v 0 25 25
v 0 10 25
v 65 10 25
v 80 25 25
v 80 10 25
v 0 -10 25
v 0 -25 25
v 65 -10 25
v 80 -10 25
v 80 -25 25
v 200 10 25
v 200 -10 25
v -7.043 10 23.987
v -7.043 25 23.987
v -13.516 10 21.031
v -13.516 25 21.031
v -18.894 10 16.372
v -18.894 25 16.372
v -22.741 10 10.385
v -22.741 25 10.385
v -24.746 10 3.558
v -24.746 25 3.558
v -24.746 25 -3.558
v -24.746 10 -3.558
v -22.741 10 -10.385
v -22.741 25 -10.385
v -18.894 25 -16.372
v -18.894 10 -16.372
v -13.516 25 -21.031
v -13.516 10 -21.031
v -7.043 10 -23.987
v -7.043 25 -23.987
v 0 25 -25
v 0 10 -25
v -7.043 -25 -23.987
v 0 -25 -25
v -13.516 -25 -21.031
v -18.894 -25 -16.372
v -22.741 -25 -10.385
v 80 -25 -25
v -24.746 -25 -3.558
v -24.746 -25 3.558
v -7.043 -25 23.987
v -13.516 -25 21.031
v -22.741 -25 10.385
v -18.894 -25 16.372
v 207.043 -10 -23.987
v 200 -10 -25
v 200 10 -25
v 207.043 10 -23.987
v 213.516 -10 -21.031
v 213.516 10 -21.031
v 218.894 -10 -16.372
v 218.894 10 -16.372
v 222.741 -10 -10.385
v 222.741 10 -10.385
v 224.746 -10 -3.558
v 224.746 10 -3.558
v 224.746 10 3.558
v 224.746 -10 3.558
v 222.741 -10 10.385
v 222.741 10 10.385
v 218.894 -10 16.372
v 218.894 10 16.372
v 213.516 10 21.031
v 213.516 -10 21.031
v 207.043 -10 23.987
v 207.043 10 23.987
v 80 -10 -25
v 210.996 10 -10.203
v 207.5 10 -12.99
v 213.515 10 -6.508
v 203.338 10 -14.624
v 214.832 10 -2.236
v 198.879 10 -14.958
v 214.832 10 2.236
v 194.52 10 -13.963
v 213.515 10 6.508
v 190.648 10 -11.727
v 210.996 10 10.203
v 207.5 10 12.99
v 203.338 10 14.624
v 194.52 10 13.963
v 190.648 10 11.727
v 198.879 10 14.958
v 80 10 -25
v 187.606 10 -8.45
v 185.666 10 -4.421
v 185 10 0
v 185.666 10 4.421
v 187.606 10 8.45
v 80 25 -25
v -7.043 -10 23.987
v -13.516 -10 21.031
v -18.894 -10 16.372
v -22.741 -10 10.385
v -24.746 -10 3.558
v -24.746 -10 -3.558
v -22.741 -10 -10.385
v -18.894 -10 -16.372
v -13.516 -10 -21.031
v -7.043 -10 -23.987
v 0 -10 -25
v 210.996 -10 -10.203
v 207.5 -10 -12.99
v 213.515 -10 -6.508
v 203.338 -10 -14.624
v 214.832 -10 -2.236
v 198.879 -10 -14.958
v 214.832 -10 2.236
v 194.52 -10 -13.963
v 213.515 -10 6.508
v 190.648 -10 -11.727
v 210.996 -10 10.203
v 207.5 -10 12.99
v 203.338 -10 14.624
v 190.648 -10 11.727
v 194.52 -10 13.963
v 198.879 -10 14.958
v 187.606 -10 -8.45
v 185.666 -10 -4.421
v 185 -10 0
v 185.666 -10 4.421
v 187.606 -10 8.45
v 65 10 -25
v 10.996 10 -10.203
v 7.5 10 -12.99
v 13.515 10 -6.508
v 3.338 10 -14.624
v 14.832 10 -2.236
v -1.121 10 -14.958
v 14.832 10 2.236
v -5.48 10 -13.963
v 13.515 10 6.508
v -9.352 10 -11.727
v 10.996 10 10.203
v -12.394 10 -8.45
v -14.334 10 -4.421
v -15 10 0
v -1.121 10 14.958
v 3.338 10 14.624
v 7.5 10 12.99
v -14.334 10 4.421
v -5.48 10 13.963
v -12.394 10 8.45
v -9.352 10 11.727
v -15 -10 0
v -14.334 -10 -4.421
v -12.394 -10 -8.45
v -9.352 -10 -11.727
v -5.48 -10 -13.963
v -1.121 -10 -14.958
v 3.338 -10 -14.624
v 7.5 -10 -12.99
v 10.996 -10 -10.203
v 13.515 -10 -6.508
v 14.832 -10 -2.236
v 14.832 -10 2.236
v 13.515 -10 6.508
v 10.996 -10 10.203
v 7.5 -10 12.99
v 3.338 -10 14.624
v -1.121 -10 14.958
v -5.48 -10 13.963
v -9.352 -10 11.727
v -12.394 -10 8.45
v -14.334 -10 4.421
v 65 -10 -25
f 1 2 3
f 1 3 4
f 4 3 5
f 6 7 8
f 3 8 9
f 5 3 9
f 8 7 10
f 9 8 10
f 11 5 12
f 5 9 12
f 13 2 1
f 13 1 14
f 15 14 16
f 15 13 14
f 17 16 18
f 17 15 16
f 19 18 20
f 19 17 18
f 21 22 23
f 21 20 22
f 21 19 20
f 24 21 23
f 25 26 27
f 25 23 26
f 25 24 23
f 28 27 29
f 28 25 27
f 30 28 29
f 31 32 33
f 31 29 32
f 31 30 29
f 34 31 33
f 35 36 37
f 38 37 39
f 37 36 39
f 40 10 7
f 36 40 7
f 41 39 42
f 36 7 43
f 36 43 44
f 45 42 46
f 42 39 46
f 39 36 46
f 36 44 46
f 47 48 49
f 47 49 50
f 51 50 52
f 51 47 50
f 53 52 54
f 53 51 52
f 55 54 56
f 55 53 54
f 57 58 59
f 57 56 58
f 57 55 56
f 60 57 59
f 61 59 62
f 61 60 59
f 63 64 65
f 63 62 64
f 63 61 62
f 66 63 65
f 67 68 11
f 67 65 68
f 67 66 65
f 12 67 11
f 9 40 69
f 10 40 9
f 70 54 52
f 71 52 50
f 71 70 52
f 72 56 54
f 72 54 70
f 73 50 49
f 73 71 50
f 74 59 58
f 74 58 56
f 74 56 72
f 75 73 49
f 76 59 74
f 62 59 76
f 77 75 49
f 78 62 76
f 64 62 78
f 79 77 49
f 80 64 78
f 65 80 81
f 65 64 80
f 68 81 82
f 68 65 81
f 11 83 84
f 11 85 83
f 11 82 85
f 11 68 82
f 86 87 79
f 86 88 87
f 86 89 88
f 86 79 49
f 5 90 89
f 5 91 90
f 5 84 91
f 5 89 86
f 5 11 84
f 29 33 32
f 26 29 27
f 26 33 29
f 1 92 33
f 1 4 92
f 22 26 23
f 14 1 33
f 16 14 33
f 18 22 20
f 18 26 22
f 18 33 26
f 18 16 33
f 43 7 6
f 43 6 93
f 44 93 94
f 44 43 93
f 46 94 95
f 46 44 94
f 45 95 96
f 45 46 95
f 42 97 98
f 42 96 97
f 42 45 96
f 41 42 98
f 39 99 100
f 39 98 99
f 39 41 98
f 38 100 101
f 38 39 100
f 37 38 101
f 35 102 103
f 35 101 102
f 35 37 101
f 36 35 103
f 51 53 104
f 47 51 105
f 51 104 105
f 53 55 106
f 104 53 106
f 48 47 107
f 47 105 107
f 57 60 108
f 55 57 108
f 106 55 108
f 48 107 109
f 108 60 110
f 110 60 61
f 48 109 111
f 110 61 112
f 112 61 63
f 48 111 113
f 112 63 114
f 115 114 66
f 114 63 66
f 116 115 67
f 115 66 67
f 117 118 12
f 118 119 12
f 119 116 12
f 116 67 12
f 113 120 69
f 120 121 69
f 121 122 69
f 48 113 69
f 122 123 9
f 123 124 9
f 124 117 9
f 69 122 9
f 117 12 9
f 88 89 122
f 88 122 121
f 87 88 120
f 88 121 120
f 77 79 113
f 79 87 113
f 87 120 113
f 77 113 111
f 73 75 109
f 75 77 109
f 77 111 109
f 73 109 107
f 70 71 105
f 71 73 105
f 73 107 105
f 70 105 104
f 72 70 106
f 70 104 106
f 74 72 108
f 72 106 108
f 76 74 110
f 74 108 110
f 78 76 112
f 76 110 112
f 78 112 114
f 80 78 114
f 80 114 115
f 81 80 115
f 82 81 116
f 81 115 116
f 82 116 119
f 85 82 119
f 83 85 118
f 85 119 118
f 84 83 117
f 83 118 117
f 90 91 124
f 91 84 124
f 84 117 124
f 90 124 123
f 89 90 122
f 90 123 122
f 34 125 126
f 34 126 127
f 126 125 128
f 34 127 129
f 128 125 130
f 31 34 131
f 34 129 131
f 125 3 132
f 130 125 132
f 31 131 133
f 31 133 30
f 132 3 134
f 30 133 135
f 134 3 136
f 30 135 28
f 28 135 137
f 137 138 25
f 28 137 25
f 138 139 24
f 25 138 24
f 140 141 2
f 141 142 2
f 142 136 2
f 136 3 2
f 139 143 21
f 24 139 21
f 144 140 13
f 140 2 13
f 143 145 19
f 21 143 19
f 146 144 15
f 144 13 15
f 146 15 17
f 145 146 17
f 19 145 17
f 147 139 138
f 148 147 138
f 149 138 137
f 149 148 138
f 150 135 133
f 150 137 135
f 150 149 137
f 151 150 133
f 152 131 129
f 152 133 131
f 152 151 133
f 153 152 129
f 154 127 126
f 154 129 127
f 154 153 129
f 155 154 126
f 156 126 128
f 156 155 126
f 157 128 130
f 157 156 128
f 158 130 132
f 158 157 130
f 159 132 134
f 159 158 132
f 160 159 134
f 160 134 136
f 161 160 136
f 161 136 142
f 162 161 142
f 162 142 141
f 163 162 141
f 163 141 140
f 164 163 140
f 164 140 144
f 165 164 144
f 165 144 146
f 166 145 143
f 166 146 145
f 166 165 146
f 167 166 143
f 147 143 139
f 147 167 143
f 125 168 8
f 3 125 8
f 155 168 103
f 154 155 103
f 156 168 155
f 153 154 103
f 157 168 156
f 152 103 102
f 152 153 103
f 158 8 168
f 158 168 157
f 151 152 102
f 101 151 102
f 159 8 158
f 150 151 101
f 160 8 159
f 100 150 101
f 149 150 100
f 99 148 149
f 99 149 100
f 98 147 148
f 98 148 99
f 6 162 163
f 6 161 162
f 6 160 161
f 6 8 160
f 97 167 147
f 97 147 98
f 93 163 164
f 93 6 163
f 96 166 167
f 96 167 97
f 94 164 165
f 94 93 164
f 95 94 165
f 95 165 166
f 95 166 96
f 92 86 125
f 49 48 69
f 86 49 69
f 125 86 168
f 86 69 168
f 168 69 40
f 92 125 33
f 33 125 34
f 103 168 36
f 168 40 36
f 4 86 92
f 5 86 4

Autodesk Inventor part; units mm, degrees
ref_plane "YZ Plane" through (0, 0, 0) normal (1, 0, 0) x (0, 1, 0)
ref_plane "XZ Plane" through (0, 0, 0) normal (0, 1, 0) x (-1, 0, 0)
ref_plane "XY Plane" through (0, 0, 0) normal (0, 0, 1) x (1, 0, 0)
sketch "Sketch1" plane through (0, 0, 0) normal (0, 1, 0) x (-1, 0, 0)
  circle A0 centre (0, 0) radius 25
  circle A1 centre (-200, 0) radius 25
  line L0 (0, 25) -> (-200, 25)
  line L1 (-200, 25) -> (-200, -25)
  line L2 (-200, -25) -> (0, -25)
  line L3 (0, -25) -> (0, 25)
  point P0 (-200, 0)
  point P1 (0, 0)
  point P2 (0, -25)
  dimension "d0" = 50
  dimension "d1" = 50
  dimension "d2" = 200
extrude "Extrusion1" add sketch "Sketch1" along normal mid plane 20
sketch "Sketch4" plane through (0, 0, 0) normal (0, 1, 0) x (-1, 0, 0)
  arc A0 (0, -25) -> (0, 25) centre (0, 0) ccw projected
  line L0 (0, -25) -> (-200, -25) projected
  arc A1 (-200, 25) -> (-200, -25) centre (-200, 0) ccw projected
  line L1 (-200, 25) -> (0, 25) projected
  line L2 (0, -25) -> (-200, -25) projected
  line L3 (-80, -25) -> (-80, 25)
  line L4 (-200, 25) -> (0, 25) projected
  dimension "d10" = 80
extrude "Extrusion3" add sketch "Sketch4" along normal mid plane 50 contours L0 L3 L1 A0
sketch "Sketch6" plane through (0, 0, 0) normal (0, 1, 0) x (-1, 0, 0)
  circle A0 centre (0, 0) radius 15
  arc A1 (-200, 25) -> (-200, -25) centre (-200, 0) ccw projected
  circle A2 centre (-200, 0) radius 15
  line L0 (0, -25) -> (-80, -25) projected
  line L1 (-65, -25) -> (-65, 25)
  arc A3 (0, -25) -> (0, 25) centre (0, 0) ccw projected
  line L2 (-80, 25) -> (0, 25) projected
  point P0 (-65, 0)
  point P1 (25, 0)
  dimension "d13" = 30
  dimension "d14" = 30
  dimension "d16" = 90
extrude "Extrusion4" cut sketch "Sketch6" along normal mid plane 20
properties part number "Manipulator Link"
